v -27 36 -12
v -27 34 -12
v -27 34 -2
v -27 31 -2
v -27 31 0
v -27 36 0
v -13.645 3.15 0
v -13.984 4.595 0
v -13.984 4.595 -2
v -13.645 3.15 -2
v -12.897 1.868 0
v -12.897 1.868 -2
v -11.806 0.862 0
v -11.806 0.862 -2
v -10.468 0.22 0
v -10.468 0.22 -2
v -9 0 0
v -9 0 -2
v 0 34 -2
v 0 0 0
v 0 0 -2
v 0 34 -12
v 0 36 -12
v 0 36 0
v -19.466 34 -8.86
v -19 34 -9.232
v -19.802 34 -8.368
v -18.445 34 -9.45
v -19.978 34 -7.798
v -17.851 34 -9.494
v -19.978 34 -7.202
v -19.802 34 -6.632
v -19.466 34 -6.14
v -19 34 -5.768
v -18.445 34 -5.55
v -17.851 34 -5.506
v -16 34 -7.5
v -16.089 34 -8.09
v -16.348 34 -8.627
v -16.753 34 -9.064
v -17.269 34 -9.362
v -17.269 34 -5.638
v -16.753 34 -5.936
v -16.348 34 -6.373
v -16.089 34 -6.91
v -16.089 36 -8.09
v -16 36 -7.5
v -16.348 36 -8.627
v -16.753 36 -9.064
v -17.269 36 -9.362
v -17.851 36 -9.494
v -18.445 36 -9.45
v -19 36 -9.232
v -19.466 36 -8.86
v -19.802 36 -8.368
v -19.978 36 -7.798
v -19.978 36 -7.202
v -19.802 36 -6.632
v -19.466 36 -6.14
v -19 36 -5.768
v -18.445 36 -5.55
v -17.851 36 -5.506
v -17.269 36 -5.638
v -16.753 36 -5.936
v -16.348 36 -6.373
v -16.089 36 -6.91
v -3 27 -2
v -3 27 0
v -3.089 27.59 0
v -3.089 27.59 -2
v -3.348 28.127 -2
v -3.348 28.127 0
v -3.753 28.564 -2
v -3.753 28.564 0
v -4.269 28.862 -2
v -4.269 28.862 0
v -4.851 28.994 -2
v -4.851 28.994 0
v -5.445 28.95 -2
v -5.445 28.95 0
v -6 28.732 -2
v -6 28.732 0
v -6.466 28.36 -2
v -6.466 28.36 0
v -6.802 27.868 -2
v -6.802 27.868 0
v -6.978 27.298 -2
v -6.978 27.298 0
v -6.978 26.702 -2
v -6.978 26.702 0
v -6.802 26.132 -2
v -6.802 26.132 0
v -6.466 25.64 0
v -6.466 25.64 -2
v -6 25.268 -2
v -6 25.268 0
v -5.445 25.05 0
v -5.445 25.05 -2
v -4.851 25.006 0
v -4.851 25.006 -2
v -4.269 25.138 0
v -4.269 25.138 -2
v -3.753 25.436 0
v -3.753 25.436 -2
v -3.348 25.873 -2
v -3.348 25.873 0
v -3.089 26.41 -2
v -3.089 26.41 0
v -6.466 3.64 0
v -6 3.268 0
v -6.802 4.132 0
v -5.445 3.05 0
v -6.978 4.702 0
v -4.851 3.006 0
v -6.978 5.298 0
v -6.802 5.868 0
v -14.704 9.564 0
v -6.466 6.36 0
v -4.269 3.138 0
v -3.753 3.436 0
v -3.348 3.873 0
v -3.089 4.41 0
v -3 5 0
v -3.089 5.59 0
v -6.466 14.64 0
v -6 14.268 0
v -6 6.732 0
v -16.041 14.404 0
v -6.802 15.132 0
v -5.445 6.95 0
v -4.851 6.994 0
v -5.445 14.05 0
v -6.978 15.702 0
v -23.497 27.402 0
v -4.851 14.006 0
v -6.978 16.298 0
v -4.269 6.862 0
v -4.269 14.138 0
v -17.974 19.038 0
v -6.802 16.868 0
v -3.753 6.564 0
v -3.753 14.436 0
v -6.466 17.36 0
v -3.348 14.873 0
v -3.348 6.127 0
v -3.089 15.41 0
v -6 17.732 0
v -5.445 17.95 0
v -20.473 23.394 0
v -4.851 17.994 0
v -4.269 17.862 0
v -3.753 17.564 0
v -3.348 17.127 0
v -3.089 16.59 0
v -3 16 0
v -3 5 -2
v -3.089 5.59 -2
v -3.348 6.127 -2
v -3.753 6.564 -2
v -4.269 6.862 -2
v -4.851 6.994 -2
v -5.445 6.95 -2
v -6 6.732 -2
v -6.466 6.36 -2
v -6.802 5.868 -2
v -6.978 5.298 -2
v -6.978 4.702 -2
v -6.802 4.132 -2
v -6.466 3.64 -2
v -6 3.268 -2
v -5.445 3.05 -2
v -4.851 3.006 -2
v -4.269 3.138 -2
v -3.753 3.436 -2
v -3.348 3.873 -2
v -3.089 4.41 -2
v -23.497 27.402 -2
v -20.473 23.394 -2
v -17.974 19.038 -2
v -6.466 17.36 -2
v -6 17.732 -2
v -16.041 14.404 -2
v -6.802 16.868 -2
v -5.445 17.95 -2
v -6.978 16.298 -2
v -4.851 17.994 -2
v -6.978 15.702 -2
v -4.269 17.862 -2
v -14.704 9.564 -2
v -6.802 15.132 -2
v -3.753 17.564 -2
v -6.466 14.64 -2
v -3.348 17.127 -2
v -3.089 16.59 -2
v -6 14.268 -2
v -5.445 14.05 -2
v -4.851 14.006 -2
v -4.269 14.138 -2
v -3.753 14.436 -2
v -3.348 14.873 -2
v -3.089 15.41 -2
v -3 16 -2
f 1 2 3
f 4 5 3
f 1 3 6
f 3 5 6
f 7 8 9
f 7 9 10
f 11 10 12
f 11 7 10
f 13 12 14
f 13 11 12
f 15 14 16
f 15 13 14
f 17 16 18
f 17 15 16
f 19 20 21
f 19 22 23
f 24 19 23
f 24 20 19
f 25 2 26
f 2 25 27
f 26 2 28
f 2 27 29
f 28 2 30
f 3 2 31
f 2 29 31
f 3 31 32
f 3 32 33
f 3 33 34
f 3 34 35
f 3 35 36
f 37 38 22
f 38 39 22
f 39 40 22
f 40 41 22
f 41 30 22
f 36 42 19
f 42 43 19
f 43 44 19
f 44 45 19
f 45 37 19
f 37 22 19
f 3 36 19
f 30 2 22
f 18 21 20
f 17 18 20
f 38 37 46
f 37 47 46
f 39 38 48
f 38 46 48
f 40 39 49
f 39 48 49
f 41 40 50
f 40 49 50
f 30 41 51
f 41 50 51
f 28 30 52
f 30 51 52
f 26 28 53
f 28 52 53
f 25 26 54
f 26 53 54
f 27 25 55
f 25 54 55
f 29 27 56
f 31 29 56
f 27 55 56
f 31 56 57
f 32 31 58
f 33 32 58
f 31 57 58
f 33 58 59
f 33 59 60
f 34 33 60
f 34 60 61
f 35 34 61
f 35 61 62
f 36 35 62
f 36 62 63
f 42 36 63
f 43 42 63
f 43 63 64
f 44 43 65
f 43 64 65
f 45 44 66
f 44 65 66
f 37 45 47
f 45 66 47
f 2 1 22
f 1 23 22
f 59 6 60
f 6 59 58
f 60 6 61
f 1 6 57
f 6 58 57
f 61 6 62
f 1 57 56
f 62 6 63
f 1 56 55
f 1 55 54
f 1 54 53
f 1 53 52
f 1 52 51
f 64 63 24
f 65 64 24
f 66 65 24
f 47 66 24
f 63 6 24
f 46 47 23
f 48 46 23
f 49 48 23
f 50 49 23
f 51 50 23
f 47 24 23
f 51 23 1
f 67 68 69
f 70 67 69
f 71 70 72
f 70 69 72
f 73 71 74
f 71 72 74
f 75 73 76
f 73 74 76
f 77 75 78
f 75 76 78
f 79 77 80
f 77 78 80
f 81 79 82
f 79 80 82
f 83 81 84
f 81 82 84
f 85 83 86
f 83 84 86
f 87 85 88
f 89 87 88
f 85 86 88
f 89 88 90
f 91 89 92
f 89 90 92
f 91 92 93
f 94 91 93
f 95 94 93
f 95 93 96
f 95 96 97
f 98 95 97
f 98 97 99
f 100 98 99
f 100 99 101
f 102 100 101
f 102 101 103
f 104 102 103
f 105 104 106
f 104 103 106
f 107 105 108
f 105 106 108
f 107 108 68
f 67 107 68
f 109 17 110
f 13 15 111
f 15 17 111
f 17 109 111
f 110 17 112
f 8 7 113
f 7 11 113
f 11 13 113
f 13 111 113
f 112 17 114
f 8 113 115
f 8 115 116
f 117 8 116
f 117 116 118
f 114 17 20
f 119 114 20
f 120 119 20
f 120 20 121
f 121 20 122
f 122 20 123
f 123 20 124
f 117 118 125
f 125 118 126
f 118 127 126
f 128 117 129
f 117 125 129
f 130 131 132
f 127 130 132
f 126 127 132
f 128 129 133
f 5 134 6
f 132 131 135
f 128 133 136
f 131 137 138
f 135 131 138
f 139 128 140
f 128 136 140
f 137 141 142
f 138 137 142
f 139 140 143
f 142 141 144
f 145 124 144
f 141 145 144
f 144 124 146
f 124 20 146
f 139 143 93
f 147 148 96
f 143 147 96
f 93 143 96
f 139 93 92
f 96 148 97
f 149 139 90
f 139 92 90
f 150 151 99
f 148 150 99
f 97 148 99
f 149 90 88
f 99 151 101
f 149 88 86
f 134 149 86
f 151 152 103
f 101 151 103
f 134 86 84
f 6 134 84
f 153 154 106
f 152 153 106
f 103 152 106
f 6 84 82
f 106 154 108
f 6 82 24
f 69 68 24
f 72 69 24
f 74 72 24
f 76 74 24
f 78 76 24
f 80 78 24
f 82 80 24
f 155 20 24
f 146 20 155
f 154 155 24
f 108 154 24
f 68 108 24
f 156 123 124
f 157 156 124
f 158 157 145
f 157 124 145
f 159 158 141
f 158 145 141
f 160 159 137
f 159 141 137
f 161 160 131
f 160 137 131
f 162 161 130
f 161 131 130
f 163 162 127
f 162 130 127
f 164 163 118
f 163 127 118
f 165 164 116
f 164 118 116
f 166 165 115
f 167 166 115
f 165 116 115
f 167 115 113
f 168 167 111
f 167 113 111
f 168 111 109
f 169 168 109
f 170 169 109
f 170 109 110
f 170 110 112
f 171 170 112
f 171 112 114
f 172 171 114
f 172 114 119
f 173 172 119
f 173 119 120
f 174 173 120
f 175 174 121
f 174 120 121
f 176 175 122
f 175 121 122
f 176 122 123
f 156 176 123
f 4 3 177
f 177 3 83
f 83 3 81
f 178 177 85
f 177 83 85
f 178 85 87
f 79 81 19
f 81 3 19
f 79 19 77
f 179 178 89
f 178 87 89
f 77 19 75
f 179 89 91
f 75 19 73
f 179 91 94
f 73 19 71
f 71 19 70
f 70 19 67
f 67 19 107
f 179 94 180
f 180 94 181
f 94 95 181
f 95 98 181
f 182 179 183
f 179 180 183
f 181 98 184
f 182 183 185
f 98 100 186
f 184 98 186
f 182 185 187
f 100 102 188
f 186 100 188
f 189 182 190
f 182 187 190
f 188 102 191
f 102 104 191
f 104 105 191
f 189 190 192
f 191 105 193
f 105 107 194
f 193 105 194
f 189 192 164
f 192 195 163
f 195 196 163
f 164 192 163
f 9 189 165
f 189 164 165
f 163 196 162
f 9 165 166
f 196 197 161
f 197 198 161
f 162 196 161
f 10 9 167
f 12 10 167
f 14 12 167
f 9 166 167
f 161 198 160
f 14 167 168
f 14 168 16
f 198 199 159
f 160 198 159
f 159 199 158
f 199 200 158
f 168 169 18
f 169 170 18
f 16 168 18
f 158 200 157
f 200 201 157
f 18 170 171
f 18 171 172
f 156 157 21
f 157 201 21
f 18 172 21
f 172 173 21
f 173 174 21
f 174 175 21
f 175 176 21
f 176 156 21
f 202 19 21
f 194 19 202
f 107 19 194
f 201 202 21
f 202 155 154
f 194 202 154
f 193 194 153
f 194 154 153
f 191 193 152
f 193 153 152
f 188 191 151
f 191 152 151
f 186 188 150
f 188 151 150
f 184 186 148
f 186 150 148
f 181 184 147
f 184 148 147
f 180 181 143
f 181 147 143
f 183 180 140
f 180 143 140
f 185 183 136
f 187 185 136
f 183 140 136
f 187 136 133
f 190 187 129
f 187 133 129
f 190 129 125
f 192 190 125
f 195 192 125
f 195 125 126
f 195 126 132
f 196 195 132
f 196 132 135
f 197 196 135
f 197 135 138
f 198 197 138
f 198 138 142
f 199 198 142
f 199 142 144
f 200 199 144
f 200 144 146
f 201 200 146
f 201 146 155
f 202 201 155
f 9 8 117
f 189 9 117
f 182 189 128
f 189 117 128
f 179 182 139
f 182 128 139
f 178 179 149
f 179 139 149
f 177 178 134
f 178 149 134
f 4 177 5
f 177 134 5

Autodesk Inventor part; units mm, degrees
ref_plane "YZ Plane" through (0, 0, 0) normal (1, 0, 0) x (0, 1, 0)
ref_plane "XZ Plane" through (0, 0, 0) normal (0, 1, 0) x (-1, 0, 0)
ref_plane "XY Plane" through (0, 0, 0) normal (0, 0, 1) x (1, 0, 0)
sketch "Sketch1" plane through (0, 0, 0) normal (1, 0, 0) x (0, 1, 0)
  line L0 (0, 0) -> (36, 0)
  line L1 (36, 0) -> (36, -12)
  line L2 (36, -12) -> (34, -12)
  line L3 (34, -12) -> (34, -2)
  line L4 (34, -2) -> (0, -2)
  line L5 (0, -2) -> (0, 0)
  dimension "d0" = 36
  dimension "d1" = 12
  dimension "d2" = 2
  dimension "d3" = 2
extrude "Extrusion1" add sketch "Sketch1" against normal blind 27
sketch "Sketch2" plane through (0, 36, 0) normal (0, 1, 0) x (1, 0, 0)
  circle A0 centre (-18, 7.5) radius 2
  line L0 (0, 0) -> (-27, 0) projected
  line L1 (0, 12) -> (0, 0) projected
  dimension "d6" = 4
  dimension "d7" = 7.5
  dimension "d8" = 18
extrude "Extrusion2" cut sketch "Sketch2" against normal blind 27
sketch "Sketch3" plane through (0, 0, 0) normal (0, 0, 1) x (1, 0, 0)
  line L0 (-27, 34) -> (-27, 0) projected
  line L1 (0, 36) -> (-27, 36) projected
  line L2 (-25.8683, 31) -> (-28.3872, 31) construction
  arc A0 (-13.9835, 4.5947) -> (-9, 0) centre (-9, 5) ccw
  line L3 (0, 0) -> (-27, 0) projected
  line L4 (0, 36) -> (0, 0) projected
  line L5 (-14, 4.4018) -> (-14, 0) construction
  circle A1 centre (-5, 27) radius 2
  circle A2 centre (-5, 16) radius 2
  circle A3 centre (-5, 5) radius 2
  line L6 (-27, 36) -> (0, 36)
  line L7 (0, 36) -> (0, 0)
  line L8 (0, 0) -> (-27, 0)
  line L9 (-27, 0) -> (-27, 36)
  arc A4 (-13.9835, 4.5947) -> (-27, 31) centre (-53.8519, 1.3525) ccw
  point P0 (-9, 0)
  dimension "d12" = 5
  dimension "d13" = 10
  dimension "d15" = 4
  dimension "d16" = 4
  dimension "d17" = 4
  dimension "d18" = 5
  dimension "d19" = 16
  dimension "d20" = 27
  dimension "d21" = 5
  dimension "d22" = 5
  dimension "d23" = 5
  dimension "d26" = 14
  dimension "d27" = 40
extrude "Extrusion3" cut sketch "Sketch3" against normal blind 27 contours A4 A0 L3 L0 | A1 | A2 | A3
